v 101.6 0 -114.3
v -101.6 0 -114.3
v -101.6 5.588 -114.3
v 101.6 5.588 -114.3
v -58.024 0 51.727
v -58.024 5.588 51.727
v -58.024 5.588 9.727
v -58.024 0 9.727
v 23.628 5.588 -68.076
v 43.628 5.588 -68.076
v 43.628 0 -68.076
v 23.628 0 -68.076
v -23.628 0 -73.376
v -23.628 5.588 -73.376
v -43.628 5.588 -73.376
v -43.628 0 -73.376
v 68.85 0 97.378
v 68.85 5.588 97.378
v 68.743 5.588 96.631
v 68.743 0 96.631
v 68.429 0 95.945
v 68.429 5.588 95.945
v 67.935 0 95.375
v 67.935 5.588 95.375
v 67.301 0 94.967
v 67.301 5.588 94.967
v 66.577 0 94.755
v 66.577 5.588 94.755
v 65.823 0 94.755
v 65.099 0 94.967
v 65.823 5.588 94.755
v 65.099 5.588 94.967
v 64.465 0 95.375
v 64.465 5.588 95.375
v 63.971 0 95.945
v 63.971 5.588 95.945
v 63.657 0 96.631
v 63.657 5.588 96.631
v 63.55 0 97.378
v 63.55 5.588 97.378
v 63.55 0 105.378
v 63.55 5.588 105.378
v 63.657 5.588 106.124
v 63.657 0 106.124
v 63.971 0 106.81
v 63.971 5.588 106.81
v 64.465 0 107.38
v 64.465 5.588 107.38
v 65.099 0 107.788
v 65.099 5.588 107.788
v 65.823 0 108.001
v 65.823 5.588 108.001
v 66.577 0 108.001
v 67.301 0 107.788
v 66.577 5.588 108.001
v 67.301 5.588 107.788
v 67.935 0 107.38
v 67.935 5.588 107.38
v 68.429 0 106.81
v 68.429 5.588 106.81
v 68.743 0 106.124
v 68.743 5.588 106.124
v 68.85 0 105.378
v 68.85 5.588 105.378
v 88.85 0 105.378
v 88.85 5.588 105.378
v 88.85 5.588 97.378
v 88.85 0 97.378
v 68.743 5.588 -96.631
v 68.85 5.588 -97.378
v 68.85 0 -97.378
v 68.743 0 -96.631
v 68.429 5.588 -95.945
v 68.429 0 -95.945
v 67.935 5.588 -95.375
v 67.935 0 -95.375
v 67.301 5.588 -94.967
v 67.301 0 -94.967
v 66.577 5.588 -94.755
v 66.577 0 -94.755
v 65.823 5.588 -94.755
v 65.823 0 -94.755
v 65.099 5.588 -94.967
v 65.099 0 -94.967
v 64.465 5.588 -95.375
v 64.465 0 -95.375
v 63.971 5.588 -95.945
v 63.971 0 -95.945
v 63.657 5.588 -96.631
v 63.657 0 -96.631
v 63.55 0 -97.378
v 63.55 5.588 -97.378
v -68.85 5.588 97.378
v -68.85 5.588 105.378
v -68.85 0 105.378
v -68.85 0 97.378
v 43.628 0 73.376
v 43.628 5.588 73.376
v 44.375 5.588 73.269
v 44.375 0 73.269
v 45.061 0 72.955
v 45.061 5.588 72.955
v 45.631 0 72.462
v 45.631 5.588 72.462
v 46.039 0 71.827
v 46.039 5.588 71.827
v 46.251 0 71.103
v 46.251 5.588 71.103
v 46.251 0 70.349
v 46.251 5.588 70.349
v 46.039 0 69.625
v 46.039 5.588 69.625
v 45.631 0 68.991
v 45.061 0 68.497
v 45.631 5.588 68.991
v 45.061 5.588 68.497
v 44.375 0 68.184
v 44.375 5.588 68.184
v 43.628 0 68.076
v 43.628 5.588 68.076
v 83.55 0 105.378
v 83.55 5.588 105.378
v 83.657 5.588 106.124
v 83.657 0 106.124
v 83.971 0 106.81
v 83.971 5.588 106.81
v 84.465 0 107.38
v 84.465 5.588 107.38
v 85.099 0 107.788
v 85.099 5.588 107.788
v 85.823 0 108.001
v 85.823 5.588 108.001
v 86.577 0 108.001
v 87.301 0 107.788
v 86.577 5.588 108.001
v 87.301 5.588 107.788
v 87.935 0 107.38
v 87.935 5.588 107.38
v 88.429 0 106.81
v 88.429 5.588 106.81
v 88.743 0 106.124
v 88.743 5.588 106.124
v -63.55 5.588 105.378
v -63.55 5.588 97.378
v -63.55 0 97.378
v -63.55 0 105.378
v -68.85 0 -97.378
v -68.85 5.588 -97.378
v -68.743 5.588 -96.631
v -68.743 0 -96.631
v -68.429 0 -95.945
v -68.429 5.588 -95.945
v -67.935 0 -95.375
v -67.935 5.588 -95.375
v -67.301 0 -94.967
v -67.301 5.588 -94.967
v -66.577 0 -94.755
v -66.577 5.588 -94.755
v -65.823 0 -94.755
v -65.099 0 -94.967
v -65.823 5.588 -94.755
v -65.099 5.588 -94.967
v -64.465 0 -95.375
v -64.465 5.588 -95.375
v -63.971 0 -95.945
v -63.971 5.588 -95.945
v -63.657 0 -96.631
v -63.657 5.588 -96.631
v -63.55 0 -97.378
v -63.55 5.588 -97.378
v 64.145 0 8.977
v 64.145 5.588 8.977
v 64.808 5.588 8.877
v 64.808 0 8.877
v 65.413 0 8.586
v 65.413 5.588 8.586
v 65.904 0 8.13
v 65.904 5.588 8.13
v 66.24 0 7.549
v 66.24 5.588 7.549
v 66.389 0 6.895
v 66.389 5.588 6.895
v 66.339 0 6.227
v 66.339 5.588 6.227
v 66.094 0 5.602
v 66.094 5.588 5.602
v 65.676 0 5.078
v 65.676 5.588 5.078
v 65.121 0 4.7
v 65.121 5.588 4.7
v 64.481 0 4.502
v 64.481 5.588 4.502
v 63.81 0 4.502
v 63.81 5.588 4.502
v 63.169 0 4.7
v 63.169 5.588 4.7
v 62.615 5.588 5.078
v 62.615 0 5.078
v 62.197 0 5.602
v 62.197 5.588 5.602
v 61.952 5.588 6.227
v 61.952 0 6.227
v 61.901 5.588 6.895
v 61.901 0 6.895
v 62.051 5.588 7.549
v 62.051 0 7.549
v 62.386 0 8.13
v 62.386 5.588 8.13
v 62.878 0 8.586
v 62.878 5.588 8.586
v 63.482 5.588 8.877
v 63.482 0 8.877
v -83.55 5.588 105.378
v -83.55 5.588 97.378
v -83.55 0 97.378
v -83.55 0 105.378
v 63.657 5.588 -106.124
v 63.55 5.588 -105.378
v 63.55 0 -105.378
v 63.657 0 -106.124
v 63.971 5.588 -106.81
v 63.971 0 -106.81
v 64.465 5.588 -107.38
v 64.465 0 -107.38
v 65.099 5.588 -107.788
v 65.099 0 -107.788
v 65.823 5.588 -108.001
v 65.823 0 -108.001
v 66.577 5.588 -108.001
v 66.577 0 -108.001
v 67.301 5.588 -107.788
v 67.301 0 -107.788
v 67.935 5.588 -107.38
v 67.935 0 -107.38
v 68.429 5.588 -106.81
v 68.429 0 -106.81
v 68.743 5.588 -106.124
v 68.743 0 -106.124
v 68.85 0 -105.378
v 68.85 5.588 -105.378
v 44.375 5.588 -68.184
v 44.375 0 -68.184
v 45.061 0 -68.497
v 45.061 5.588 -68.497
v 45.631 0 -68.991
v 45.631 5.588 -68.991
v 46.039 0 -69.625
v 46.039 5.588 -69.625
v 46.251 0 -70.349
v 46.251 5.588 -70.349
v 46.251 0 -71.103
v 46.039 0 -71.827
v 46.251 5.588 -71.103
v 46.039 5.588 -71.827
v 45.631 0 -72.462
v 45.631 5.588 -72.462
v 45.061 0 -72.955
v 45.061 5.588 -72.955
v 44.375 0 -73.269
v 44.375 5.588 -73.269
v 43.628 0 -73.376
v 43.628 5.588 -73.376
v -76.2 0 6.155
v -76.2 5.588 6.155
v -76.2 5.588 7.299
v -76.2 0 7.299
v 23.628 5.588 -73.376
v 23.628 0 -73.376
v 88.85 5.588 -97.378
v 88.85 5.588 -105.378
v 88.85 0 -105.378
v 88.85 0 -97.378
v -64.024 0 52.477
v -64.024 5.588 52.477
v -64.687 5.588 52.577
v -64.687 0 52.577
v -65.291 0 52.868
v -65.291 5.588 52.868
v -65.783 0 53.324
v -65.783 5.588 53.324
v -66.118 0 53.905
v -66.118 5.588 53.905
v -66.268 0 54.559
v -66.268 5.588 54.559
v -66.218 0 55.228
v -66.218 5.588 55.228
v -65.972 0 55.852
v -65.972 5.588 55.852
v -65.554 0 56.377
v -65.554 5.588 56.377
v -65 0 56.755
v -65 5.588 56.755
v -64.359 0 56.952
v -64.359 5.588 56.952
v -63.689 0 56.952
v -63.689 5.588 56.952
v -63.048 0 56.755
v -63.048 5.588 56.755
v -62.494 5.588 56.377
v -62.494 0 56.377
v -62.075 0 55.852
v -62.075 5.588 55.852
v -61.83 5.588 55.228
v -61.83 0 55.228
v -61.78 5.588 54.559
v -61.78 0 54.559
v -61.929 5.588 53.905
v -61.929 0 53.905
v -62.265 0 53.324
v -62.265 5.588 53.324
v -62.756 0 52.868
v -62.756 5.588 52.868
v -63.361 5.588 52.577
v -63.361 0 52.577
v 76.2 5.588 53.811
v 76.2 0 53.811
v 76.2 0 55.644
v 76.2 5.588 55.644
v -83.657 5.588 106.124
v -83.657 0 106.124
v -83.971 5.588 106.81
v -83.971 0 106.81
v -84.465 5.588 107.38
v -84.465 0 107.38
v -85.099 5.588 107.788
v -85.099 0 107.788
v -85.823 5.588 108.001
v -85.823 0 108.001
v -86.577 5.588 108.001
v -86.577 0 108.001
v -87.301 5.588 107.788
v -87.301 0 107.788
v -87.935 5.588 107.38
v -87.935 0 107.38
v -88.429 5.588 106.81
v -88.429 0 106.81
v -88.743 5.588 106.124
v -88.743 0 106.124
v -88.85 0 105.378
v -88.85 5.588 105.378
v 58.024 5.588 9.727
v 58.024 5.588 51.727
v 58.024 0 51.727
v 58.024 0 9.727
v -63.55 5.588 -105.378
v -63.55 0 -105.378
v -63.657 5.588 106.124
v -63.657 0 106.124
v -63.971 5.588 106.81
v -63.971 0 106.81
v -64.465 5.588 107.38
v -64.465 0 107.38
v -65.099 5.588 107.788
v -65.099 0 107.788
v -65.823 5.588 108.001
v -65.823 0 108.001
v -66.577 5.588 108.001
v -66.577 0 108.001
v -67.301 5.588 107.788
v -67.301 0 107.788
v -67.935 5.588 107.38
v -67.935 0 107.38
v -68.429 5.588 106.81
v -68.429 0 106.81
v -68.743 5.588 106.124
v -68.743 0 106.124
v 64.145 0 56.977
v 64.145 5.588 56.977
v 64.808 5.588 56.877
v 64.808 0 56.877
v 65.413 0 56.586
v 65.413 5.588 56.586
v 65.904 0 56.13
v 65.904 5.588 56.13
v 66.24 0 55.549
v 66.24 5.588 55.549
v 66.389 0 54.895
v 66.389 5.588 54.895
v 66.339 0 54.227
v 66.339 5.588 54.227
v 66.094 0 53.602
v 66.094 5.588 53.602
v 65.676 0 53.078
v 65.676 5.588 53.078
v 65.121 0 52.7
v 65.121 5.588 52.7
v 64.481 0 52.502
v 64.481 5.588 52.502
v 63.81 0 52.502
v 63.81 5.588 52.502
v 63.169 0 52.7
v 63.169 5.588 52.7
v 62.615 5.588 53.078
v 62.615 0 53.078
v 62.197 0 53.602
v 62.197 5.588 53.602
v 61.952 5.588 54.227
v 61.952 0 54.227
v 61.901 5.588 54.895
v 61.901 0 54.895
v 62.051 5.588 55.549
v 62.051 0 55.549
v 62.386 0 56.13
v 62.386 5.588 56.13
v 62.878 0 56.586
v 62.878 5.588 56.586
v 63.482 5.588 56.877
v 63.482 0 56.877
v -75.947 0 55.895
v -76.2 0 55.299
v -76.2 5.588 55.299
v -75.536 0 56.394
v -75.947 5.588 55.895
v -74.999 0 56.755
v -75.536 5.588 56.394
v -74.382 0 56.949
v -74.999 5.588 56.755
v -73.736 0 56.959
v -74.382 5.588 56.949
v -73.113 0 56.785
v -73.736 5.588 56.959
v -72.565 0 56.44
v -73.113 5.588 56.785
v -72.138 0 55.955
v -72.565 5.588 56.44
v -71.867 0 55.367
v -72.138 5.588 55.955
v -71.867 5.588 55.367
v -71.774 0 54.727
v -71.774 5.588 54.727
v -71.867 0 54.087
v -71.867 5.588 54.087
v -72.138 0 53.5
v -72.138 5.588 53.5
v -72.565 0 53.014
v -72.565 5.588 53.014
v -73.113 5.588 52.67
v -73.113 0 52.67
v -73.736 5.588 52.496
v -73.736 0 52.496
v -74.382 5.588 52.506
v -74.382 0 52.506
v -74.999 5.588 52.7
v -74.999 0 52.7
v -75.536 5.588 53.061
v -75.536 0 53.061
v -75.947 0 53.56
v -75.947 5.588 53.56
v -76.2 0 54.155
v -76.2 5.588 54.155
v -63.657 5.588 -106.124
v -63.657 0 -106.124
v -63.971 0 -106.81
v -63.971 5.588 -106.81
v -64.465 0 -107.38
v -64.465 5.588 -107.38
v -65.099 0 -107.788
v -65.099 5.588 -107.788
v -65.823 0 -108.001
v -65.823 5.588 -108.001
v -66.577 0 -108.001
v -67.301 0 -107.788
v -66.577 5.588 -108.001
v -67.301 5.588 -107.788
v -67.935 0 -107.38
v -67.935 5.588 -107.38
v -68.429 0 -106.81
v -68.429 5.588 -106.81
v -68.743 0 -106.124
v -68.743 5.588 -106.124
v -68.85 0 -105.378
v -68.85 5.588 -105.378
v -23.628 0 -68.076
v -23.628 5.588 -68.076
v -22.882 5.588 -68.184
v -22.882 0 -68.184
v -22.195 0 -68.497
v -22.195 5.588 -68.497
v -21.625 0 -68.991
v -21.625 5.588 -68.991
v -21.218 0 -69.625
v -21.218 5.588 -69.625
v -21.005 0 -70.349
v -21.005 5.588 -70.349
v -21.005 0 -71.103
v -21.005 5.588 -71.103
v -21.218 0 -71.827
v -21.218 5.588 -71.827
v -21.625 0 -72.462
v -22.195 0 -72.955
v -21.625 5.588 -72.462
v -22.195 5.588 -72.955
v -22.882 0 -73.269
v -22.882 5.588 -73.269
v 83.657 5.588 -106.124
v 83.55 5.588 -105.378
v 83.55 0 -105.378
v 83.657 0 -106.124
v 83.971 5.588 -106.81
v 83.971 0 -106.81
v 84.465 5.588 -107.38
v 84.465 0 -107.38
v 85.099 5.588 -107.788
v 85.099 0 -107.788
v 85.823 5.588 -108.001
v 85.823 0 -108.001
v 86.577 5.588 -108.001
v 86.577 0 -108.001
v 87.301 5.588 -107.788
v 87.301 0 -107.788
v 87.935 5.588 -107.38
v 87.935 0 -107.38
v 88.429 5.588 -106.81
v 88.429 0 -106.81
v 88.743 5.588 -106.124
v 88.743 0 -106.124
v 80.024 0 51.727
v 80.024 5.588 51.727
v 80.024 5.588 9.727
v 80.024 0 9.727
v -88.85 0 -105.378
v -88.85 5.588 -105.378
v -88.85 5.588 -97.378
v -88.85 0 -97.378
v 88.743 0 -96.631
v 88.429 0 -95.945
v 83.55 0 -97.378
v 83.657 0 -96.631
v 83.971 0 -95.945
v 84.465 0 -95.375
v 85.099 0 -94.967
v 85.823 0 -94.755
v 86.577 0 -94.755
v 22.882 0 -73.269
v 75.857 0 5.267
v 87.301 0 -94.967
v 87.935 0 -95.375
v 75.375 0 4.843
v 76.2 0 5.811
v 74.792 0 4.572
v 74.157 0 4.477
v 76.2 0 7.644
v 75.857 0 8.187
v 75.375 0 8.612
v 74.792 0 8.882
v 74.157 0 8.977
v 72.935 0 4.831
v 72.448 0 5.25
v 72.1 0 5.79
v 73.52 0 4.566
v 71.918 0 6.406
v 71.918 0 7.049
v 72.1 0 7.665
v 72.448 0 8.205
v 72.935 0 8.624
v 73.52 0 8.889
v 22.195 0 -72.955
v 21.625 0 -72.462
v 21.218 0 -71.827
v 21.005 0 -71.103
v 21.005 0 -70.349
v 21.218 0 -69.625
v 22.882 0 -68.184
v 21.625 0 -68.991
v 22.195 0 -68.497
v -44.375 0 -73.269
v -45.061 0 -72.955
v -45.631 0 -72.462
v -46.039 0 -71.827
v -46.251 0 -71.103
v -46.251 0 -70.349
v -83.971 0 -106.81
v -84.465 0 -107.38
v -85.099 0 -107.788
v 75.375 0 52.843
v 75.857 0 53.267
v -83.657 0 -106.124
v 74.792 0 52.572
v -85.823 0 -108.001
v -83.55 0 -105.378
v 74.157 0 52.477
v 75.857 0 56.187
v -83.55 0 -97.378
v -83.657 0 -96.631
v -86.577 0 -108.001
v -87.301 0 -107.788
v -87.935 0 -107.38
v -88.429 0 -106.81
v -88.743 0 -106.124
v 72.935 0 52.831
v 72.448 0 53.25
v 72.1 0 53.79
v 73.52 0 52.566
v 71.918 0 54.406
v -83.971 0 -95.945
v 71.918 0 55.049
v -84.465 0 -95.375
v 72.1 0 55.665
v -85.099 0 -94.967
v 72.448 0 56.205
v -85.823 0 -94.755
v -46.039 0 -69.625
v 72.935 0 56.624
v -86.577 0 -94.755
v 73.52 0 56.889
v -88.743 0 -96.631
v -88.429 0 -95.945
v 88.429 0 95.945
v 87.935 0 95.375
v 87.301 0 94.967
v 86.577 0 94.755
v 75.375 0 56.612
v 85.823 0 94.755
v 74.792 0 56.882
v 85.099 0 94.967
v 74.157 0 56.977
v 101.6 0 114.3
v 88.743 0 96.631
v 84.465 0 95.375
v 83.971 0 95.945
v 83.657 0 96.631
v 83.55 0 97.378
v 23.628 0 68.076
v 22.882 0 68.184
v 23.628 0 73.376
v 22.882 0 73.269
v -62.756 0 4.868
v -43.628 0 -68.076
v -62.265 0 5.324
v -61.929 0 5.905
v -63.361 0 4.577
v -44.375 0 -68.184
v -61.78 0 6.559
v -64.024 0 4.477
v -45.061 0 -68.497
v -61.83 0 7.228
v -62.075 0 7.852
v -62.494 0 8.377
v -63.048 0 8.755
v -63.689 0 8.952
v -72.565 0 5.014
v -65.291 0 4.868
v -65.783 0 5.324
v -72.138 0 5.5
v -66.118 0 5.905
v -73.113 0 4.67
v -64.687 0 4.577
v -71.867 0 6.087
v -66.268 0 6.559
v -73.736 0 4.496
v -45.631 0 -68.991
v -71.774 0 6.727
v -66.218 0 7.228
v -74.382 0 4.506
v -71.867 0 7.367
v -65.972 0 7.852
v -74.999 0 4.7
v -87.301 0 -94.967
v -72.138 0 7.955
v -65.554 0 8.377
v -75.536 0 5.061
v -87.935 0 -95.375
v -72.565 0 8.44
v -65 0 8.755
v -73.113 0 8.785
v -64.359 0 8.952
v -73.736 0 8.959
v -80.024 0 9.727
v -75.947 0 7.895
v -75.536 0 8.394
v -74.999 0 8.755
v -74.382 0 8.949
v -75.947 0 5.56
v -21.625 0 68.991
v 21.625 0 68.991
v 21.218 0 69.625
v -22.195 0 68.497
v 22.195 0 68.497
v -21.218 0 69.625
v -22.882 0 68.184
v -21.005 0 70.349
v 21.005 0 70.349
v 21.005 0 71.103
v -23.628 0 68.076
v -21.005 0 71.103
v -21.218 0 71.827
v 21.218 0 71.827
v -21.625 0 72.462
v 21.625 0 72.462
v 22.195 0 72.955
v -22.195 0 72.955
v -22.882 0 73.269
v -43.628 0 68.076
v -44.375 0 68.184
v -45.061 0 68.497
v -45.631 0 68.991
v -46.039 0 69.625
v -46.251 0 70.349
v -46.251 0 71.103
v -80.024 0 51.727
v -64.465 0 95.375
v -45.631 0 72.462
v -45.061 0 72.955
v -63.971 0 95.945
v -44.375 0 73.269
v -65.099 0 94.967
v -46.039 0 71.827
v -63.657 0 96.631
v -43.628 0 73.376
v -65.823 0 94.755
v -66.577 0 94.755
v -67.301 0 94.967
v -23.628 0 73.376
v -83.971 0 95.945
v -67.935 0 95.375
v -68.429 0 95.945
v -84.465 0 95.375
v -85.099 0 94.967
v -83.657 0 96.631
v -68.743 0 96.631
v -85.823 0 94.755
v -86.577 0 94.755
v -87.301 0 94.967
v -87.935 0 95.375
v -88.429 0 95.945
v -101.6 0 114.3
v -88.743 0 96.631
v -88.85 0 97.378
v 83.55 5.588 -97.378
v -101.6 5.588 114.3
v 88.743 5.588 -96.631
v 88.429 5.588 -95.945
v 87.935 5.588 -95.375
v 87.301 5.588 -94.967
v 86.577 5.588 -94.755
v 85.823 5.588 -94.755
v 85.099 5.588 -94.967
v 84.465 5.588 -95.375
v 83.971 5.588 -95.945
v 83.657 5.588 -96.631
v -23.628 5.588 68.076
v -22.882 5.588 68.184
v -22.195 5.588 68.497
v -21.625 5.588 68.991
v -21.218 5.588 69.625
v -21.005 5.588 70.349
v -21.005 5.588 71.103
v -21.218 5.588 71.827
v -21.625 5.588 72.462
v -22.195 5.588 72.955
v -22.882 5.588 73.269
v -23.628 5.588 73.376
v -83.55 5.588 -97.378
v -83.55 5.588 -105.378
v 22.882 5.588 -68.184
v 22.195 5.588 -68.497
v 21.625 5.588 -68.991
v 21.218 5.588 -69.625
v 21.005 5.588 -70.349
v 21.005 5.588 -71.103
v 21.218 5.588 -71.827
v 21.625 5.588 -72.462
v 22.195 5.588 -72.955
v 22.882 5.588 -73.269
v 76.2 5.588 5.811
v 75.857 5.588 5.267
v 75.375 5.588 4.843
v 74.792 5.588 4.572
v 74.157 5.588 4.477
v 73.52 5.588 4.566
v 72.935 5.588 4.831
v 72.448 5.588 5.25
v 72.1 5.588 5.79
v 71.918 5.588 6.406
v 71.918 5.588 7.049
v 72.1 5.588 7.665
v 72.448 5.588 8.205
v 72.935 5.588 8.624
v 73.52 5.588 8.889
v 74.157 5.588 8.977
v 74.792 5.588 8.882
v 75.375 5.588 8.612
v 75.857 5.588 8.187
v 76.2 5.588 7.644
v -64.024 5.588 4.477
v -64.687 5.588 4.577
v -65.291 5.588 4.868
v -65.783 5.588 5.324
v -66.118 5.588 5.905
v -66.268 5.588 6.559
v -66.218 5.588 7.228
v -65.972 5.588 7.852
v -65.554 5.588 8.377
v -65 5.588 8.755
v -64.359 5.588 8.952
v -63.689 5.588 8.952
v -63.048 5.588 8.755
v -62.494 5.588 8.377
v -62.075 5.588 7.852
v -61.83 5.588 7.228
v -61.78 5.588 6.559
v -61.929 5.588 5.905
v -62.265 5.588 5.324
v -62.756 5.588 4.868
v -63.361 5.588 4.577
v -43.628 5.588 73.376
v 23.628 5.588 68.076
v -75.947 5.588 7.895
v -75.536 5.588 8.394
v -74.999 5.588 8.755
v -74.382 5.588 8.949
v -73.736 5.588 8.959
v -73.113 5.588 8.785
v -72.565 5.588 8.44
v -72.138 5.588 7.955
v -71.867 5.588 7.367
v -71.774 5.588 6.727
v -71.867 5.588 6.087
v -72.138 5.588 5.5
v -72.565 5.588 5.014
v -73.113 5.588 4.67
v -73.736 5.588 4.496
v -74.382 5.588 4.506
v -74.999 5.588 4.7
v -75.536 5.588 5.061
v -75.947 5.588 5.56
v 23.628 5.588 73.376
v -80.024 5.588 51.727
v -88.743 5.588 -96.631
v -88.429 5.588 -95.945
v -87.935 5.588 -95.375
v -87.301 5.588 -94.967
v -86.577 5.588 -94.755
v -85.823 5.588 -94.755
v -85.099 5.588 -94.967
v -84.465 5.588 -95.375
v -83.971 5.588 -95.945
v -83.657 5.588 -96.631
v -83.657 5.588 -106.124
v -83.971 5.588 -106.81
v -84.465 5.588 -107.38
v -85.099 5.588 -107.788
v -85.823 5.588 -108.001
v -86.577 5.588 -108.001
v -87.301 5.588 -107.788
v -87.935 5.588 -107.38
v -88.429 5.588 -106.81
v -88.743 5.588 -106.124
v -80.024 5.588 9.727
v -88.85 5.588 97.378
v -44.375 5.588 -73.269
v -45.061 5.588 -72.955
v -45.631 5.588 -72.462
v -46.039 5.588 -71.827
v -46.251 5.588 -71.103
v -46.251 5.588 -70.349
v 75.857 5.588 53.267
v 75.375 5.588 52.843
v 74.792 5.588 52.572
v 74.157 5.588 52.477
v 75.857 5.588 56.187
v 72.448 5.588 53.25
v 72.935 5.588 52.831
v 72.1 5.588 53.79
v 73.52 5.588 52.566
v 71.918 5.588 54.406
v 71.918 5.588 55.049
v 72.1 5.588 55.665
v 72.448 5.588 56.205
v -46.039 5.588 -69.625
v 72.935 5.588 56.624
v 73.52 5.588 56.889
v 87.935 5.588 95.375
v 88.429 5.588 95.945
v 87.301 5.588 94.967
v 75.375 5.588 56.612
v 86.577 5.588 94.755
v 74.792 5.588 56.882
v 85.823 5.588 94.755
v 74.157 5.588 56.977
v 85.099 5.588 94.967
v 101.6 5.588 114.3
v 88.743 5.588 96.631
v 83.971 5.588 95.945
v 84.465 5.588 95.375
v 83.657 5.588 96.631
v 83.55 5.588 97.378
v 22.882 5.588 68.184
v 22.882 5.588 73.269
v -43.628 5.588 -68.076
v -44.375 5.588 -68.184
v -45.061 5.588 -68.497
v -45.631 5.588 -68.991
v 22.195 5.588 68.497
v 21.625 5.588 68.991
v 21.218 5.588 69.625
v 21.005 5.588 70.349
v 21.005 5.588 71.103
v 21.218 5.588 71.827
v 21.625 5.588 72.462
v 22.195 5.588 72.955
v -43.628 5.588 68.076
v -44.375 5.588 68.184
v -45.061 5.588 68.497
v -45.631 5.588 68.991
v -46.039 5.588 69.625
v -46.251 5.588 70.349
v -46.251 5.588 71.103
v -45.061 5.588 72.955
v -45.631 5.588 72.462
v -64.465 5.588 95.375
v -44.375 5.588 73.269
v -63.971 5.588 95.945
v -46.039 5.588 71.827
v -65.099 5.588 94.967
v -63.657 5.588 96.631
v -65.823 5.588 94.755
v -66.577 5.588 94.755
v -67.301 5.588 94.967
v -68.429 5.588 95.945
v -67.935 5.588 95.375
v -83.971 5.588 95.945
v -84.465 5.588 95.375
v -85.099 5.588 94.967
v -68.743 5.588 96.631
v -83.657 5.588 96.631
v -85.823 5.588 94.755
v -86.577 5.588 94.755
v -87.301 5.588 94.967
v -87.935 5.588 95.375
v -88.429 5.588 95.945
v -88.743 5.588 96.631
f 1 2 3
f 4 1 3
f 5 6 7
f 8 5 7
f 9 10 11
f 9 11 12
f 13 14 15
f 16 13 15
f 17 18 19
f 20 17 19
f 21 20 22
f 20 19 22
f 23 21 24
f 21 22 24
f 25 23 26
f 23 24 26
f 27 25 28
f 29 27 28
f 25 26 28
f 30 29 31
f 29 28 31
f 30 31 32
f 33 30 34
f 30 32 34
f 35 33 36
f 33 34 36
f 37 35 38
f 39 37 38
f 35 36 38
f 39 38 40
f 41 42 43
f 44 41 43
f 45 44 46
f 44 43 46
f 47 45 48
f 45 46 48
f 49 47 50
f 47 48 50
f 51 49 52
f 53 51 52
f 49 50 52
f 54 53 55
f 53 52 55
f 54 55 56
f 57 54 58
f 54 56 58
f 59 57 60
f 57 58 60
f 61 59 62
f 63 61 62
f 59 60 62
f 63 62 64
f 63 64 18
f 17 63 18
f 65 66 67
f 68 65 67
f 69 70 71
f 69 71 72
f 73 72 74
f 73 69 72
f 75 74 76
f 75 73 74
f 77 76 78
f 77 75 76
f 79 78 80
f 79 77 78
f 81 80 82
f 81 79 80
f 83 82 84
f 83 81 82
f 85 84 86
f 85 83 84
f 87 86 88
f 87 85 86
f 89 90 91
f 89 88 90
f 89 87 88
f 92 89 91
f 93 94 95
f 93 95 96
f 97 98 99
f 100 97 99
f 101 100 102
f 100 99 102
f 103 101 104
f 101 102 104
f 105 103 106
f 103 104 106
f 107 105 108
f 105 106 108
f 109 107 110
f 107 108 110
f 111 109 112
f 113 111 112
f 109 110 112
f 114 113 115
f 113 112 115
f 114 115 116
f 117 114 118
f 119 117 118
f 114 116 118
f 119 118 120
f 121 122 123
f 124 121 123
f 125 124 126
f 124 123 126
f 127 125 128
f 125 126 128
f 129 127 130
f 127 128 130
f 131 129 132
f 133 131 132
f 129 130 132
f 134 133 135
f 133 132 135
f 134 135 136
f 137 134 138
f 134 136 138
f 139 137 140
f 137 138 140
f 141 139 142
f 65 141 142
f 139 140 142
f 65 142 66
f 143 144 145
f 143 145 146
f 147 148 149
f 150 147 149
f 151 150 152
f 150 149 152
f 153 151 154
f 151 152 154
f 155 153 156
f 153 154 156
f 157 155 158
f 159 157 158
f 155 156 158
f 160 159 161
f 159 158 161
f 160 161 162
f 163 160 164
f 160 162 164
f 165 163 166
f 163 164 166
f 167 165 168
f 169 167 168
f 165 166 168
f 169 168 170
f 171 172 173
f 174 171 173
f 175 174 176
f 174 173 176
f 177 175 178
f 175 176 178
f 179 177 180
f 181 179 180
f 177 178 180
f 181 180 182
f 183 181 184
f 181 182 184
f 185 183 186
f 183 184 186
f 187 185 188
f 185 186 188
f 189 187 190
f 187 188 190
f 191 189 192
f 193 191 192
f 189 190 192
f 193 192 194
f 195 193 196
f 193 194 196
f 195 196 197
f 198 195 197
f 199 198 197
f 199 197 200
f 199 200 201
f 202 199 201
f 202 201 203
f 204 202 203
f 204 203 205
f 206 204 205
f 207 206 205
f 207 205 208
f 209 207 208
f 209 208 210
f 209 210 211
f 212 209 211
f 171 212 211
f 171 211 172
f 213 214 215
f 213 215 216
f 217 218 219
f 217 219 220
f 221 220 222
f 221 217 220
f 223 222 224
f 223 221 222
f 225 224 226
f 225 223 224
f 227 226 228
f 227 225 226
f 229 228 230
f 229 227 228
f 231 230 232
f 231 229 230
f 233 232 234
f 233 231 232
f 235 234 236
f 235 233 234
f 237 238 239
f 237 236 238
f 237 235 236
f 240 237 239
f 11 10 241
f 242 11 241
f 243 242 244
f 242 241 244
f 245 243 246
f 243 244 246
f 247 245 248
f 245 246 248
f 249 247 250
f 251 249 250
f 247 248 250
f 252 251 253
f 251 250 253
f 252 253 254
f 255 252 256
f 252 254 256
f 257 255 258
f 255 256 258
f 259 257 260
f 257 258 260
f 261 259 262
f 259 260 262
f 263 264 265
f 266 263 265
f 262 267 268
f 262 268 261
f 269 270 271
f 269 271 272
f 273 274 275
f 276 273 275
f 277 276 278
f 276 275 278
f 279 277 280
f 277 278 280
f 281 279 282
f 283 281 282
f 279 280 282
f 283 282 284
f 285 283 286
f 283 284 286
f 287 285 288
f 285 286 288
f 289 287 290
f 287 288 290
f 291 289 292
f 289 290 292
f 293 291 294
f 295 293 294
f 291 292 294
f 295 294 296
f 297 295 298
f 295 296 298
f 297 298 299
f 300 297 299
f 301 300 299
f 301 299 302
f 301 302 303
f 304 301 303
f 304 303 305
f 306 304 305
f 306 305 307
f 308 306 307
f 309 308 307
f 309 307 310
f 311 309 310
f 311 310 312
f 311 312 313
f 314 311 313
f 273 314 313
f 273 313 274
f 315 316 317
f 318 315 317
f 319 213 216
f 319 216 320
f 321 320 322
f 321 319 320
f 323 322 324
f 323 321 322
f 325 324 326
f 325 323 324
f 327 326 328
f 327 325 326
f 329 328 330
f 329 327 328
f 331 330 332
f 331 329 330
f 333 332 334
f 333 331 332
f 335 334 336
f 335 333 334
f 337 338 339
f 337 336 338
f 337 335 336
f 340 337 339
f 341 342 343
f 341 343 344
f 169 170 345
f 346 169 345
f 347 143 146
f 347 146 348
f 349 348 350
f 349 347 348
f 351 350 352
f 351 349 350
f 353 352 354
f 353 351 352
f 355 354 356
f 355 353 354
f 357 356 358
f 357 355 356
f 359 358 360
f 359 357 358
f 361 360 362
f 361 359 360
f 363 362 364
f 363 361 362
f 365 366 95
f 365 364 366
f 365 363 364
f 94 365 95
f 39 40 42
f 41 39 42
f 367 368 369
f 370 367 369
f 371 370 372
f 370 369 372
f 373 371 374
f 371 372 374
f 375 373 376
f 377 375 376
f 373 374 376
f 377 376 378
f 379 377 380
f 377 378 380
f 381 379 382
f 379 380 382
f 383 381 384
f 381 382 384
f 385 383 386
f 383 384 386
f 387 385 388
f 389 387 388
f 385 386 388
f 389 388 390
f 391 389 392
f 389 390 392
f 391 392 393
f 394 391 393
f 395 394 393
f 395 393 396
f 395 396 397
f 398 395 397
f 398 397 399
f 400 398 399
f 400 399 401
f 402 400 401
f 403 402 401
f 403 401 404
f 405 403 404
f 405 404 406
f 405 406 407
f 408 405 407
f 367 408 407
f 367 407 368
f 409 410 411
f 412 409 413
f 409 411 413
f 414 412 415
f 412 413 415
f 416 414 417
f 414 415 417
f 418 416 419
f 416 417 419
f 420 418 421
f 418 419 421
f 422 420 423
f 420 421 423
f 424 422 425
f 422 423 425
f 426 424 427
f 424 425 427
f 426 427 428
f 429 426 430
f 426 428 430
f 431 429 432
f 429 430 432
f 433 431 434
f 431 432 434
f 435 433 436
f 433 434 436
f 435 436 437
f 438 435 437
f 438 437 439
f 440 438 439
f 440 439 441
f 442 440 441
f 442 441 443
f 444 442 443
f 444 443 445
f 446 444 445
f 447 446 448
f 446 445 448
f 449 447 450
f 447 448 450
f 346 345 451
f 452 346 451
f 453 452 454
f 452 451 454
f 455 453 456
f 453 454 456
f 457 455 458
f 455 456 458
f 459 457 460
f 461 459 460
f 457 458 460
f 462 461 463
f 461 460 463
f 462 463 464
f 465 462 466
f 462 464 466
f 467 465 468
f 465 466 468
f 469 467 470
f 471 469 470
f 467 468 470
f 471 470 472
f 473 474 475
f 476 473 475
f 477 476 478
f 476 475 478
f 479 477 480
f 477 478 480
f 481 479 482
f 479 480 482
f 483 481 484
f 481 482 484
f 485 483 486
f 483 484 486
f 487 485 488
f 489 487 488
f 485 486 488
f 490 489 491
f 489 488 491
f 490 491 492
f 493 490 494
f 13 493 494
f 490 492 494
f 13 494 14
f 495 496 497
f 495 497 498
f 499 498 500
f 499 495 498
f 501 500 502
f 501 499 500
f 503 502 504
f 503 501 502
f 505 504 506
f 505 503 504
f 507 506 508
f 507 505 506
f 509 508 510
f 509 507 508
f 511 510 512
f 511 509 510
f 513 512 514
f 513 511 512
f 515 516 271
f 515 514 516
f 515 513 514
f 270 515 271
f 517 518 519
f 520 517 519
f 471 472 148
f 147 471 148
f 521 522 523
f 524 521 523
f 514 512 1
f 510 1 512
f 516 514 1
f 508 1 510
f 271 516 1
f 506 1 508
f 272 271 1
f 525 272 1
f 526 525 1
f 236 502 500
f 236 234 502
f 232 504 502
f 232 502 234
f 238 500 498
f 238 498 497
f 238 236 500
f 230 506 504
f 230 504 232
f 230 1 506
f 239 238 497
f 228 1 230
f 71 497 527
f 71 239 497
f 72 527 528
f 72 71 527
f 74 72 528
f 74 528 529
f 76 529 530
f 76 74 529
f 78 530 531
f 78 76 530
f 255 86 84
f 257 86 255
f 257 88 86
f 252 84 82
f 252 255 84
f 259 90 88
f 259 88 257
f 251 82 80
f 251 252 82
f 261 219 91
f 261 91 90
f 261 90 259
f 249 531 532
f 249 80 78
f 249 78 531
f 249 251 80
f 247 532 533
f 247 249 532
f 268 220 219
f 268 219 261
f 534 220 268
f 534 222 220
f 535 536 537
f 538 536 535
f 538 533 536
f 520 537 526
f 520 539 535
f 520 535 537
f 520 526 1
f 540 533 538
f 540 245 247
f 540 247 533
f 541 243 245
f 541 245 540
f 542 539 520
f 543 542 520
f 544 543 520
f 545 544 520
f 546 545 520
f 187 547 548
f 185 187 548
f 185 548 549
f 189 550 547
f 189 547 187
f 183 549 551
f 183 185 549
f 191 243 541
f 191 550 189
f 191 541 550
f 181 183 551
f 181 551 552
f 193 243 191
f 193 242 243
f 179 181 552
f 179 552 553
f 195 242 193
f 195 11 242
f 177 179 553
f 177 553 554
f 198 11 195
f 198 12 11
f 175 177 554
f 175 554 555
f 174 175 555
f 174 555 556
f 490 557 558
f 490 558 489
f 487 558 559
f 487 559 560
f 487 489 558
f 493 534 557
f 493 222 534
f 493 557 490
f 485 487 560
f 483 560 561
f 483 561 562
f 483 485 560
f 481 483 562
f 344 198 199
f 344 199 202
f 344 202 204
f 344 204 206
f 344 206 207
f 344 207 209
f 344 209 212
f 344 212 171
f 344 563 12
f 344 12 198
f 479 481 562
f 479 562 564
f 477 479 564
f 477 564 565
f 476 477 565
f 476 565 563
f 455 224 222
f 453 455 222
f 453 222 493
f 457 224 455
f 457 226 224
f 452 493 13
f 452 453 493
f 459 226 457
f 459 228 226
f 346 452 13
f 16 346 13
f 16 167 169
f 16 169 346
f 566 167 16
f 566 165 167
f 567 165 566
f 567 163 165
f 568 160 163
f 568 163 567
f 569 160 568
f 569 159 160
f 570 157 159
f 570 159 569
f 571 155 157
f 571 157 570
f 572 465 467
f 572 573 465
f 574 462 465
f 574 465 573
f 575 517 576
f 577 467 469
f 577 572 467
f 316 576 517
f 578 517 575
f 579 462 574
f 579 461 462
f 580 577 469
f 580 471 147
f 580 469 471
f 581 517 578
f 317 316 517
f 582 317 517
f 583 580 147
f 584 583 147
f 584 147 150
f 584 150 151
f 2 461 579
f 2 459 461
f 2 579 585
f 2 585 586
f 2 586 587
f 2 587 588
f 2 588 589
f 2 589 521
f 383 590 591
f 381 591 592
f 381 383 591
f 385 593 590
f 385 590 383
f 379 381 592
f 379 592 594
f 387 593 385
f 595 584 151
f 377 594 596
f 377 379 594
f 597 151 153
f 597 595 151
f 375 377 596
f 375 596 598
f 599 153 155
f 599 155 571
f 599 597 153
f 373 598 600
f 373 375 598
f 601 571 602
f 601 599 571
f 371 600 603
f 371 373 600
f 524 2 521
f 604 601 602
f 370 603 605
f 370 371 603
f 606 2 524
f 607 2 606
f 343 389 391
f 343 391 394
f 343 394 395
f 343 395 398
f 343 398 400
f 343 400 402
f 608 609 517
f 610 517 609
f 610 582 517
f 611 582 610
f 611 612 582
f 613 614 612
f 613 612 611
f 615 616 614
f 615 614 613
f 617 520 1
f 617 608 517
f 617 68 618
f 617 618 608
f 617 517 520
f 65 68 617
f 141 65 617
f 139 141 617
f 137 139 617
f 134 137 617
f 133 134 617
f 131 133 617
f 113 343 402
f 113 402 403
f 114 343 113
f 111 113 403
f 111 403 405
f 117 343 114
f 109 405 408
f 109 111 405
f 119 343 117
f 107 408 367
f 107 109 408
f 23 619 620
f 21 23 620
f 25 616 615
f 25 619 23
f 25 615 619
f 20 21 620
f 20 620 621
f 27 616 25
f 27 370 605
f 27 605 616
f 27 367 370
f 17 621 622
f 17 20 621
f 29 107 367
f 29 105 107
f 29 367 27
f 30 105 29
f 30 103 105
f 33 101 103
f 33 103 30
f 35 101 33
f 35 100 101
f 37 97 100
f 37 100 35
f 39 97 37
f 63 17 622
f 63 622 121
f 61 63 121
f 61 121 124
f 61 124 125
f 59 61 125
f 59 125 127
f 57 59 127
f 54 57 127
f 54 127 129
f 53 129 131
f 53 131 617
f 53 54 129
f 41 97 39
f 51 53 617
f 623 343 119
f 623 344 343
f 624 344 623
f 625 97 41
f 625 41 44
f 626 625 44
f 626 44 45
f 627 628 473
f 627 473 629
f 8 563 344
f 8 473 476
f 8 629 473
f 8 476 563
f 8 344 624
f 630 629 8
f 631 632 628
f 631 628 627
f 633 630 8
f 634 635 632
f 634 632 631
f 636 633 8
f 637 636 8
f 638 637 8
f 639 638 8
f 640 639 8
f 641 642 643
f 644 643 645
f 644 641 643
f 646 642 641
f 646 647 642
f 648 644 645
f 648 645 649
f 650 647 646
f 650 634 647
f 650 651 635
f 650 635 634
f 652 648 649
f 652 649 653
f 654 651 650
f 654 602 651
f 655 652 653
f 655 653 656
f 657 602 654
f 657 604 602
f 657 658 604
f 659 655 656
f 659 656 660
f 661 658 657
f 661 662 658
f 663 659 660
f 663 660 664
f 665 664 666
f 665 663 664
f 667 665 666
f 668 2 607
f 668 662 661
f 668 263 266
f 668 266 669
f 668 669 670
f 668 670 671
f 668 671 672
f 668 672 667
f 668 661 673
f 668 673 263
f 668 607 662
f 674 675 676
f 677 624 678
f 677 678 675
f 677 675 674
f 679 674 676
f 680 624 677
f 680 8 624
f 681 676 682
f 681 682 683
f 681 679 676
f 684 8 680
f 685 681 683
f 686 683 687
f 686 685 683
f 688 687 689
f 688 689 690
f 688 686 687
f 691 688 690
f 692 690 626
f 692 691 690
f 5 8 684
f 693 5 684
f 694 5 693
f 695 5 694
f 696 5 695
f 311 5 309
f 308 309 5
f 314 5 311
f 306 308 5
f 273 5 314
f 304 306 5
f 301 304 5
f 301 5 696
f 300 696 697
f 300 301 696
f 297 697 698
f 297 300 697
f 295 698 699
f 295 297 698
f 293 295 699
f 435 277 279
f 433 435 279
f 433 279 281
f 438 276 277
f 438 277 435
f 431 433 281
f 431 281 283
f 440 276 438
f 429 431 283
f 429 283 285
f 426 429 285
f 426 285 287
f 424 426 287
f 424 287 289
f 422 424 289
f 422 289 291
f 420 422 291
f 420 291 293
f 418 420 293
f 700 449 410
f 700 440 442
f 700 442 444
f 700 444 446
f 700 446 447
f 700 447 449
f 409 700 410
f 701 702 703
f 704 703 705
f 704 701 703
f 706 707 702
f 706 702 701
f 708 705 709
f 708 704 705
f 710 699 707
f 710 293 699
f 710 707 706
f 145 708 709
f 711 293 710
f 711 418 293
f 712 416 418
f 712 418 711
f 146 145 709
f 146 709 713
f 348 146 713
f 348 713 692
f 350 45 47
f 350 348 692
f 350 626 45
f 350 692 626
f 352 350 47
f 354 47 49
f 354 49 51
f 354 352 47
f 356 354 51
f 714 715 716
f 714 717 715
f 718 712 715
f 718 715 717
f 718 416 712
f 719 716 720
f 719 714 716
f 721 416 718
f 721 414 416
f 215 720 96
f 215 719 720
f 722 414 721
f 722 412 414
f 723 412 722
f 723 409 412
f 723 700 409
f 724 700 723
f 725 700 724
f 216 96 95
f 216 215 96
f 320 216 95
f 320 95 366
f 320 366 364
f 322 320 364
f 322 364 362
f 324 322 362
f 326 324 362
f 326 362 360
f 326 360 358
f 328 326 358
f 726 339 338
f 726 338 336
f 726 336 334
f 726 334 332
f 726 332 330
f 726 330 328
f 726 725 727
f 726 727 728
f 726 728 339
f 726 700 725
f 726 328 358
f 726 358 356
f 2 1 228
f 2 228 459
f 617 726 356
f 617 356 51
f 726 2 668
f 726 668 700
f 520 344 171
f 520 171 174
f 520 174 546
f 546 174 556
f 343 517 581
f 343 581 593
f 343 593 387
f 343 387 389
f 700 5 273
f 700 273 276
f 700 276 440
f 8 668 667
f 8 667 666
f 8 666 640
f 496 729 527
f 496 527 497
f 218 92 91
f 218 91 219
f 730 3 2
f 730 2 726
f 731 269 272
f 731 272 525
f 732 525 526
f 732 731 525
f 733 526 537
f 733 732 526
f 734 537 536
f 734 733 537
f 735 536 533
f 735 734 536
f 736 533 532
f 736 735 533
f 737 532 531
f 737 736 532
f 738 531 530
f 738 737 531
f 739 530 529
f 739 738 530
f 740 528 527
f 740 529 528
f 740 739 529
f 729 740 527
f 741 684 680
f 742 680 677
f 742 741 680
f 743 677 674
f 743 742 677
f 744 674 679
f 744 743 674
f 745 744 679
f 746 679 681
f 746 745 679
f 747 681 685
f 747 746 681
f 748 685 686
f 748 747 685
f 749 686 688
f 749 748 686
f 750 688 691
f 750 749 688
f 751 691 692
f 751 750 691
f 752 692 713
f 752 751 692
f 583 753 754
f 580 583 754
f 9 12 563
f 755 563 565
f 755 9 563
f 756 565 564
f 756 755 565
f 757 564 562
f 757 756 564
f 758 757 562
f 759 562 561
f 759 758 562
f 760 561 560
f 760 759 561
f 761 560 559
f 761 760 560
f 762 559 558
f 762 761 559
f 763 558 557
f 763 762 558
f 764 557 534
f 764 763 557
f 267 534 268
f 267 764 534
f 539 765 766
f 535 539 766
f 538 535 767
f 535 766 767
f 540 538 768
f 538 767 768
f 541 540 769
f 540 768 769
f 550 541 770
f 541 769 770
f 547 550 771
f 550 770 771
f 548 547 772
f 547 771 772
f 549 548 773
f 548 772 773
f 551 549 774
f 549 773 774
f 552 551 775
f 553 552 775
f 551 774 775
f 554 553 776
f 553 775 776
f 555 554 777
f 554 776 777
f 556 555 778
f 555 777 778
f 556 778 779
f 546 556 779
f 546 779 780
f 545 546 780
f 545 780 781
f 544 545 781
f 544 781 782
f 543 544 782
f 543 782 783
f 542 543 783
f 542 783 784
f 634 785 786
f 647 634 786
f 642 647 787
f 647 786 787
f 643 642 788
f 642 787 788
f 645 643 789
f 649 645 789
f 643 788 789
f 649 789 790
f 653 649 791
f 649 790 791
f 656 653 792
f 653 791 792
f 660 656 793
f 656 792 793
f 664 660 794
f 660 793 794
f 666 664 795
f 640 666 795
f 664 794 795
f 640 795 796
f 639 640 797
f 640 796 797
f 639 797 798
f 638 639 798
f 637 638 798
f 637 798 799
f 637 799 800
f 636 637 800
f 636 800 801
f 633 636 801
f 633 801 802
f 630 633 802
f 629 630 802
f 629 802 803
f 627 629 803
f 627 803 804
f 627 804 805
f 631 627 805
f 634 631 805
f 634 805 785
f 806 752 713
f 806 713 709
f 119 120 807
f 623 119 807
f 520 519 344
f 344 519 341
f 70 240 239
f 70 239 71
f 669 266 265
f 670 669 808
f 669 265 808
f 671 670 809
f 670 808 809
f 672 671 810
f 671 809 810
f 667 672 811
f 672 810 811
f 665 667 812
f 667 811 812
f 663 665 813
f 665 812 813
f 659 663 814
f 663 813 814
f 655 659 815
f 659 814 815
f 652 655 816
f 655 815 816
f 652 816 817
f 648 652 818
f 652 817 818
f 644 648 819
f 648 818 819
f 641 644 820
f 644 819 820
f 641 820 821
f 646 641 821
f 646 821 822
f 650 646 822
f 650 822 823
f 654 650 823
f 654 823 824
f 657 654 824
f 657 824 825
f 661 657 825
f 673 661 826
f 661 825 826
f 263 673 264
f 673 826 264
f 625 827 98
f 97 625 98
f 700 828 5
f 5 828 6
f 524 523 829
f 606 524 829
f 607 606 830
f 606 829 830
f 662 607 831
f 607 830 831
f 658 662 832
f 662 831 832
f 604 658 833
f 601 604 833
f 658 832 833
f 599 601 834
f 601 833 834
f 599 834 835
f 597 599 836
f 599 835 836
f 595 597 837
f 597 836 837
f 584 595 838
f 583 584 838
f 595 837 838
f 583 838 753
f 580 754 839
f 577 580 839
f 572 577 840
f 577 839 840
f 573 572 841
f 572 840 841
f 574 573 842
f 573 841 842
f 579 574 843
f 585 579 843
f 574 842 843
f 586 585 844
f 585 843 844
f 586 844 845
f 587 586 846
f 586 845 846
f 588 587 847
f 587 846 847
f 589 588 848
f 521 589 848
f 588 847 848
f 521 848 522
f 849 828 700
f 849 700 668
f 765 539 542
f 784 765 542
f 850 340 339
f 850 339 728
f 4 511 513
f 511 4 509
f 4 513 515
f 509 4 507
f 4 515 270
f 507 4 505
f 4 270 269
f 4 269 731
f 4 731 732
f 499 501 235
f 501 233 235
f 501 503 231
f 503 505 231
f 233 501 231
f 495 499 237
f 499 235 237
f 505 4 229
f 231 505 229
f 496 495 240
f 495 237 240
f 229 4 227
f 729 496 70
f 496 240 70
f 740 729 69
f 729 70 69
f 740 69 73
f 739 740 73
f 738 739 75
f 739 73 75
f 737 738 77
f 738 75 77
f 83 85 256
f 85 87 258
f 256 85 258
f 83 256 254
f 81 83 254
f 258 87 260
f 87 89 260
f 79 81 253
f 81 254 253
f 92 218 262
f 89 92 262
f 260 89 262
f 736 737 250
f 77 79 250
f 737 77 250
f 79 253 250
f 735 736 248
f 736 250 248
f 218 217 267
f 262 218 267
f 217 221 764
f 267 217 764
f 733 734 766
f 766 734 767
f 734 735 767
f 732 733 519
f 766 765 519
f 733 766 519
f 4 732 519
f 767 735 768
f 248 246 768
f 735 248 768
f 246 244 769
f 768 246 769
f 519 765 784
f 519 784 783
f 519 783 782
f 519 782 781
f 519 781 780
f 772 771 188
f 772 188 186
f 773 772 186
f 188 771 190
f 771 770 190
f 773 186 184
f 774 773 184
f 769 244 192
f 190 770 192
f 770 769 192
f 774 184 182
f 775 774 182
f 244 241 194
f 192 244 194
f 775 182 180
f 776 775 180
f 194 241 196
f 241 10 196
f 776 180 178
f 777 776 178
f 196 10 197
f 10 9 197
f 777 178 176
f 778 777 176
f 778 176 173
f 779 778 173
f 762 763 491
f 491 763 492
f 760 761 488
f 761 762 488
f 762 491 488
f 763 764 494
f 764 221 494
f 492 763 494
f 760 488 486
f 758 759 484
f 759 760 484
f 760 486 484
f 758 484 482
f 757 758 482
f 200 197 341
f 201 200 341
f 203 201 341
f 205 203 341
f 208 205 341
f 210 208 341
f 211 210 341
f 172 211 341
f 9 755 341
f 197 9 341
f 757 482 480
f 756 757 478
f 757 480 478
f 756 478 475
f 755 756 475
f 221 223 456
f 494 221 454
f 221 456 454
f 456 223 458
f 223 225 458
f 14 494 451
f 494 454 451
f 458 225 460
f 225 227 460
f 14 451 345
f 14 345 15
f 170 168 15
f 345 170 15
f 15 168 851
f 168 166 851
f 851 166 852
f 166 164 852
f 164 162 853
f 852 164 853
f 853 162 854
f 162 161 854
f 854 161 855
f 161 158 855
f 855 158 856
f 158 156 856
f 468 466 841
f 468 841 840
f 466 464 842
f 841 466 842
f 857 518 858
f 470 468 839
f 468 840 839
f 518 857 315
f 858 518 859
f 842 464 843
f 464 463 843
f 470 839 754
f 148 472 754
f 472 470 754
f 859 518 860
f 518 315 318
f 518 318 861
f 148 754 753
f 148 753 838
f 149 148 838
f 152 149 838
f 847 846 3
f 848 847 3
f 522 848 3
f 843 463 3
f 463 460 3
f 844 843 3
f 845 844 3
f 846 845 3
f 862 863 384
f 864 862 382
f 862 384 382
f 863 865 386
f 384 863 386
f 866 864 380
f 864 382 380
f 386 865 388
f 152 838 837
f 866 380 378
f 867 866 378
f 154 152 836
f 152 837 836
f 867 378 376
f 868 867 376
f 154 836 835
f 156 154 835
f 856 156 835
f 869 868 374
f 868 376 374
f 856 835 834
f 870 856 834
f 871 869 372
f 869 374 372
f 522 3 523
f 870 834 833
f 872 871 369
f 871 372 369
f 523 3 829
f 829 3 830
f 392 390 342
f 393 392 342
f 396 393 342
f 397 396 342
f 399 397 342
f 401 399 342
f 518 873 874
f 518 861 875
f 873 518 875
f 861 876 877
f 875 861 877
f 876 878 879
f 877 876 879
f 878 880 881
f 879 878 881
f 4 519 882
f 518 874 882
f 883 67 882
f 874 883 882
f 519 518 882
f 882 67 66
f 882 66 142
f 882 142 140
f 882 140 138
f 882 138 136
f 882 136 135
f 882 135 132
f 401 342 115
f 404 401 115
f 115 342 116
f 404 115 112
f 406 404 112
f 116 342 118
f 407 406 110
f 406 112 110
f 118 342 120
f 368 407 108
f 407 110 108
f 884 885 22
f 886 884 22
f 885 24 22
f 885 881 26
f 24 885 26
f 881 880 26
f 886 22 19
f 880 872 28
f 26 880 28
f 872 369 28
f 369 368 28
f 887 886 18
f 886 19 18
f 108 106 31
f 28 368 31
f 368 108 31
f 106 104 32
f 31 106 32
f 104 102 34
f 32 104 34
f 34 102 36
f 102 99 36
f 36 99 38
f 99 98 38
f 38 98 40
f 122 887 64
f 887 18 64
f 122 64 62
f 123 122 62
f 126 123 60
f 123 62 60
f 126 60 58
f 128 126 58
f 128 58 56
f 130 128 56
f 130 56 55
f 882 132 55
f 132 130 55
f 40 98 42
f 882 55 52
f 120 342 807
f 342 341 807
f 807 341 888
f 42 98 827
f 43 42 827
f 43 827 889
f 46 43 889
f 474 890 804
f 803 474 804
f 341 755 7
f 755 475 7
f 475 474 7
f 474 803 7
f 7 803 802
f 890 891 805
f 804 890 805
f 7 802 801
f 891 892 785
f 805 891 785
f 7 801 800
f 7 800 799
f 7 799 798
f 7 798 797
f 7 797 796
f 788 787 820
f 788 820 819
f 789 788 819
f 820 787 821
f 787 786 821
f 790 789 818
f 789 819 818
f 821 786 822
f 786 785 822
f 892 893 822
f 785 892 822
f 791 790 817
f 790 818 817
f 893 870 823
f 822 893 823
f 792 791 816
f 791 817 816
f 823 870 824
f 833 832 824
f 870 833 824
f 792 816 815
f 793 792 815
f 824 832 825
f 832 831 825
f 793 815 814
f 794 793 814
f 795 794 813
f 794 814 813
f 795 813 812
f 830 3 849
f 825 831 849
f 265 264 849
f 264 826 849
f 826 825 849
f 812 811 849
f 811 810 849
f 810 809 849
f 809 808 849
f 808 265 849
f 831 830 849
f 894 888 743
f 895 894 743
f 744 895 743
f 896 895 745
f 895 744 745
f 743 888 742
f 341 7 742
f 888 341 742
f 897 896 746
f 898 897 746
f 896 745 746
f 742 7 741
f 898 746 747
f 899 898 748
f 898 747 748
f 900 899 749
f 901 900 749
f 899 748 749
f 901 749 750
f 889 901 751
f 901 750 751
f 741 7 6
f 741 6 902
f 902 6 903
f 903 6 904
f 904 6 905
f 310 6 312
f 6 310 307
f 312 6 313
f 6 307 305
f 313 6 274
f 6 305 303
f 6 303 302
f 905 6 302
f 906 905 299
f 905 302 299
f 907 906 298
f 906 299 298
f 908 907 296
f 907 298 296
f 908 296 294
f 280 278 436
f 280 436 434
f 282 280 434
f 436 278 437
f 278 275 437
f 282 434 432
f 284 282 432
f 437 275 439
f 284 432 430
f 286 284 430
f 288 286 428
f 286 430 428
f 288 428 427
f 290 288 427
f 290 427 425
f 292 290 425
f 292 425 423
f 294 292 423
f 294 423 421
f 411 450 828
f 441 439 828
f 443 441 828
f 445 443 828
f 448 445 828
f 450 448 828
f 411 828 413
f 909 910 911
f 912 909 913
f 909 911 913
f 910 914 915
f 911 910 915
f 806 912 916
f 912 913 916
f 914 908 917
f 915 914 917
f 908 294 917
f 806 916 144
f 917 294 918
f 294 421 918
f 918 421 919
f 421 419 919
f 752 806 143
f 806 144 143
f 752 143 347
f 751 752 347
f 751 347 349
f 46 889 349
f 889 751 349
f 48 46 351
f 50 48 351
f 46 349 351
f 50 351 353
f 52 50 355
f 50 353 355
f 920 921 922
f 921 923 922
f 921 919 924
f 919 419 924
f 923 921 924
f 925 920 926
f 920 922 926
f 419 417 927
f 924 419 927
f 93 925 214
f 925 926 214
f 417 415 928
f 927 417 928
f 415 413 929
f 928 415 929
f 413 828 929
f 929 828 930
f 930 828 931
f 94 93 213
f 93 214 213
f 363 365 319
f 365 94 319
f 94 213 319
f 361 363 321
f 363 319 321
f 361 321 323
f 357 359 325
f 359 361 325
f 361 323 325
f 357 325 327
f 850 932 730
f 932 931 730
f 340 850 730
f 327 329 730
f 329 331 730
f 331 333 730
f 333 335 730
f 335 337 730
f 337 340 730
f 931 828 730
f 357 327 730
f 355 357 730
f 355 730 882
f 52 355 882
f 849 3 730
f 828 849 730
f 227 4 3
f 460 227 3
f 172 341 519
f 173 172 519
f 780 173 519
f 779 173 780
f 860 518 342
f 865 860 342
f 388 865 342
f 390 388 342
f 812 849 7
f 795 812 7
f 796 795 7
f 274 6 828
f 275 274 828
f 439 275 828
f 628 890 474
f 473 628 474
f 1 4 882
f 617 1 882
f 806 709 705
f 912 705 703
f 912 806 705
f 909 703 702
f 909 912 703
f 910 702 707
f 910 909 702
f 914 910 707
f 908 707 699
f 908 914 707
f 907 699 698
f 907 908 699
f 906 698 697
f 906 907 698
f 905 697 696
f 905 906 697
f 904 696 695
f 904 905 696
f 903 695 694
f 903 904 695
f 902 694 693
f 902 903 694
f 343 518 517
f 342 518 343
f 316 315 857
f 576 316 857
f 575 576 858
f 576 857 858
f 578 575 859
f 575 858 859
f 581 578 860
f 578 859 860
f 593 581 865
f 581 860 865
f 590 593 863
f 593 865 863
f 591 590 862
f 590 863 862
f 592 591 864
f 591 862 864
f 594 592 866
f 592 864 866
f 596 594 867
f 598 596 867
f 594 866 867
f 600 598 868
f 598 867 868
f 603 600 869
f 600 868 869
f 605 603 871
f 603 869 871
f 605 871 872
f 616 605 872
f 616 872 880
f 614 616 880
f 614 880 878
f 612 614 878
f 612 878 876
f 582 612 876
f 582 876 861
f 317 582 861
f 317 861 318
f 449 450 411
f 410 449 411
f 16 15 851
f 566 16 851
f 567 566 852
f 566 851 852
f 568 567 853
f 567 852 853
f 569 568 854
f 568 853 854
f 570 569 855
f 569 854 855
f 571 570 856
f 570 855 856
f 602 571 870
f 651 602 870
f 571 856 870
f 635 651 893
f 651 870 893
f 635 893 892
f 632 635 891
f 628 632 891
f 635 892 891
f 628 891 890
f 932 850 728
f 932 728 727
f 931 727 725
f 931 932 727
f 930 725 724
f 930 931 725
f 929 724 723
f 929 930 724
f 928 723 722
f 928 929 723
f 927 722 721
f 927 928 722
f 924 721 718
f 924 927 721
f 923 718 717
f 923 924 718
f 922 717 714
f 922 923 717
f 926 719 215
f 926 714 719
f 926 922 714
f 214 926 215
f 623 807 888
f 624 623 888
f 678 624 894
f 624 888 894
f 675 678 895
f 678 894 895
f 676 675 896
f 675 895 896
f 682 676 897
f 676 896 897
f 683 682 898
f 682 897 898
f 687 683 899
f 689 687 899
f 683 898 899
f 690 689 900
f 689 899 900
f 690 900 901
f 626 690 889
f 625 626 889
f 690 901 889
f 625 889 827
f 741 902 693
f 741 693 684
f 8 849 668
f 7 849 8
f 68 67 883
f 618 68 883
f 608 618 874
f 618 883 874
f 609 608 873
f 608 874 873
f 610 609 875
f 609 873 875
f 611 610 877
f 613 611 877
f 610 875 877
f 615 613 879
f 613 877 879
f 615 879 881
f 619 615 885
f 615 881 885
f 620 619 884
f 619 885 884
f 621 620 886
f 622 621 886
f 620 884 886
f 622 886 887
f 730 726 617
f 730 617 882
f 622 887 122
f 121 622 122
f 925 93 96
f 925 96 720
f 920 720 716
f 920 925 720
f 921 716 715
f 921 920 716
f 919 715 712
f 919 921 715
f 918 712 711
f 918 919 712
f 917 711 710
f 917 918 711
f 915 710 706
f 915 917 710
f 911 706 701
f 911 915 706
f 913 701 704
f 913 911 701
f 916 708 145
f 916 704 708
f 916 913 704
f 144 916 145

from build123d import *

# Parameters (mm, degrees)
SKETCH1_W                                = 152.4
SKETCH1_H                                = 228.6
BOSS_EXTRUDE1_DEPTH                      = 5.588
SKETCH2_R                                = 2.25
SKETCH2_W                                = 22
SKETCH2_H                                = 42
CUT_EXTRUDE1_DEPTH                       = 138.48511099
SKETCH6_R                                = 2.65
CUT_EXTRUDE2_DEPTH                       = 430.910746044
CUT_EXTRUDE3_DEPTH                       = 138.48511099
MIRROR1_AT_THE_SECOND_PLANE_COPY_1_DEPTH = 138.48511099
SKETCH8_R                                = 2.65
CUT_EXTRUDE4_DEPTH                       = 430.910746044
CUT_EXTRUDE5_DEPTH                       = 138.48511099
MIRROR2_AT_THE_SECOND_PLANE_COPY_1_DEPTH = 138.48511099
SKETCH10_W                               = 228.6
SKETCH10_H                               = 5.588
BOSS_EXTRUDE2_DEPTH                      = 25.4
SKETCH11_W                               = 22
SKETCH11_H                               = 42
CUT_EXTRUDE6_DEPTH                       = 154.030309887
CUT_EXTRUDE7_DEPTH                       = 154.030309887
MIRROR5_AT_THE_SECOND_PLANE_COPY_1_DEPTH = 154.030309887


with BuildPart() as part:
    # Sketch1 → Boss-Extrude1 (new body)
    with BuildSketch(Plane(origin=(0, 0, 0), x_dir=(1, 0, 0), z_dir=(0, 1, 0))):
        Rectangle(SKETCH1_W, SKETCH1_H)
    extrude(amount=BOSS_EXTRUDE1_DEPTH)

    # Sketch2 → Cut-Extrude1 (cut, through all)
    with BuildSketch(Plane(origin=(0, 5.588, 0), x_dir=(1, 0, 0), z_dir=(0, 1, 0))):
        with Locations(Location((64.145199836, -6.727348554, 0), (0, 0, 270))):
            Circle(SKETCH2_R)
        with Locations((74.145199836, -6.727348554)):
            Circle(SKETCH2_R)
        with Locations(Location((64.145199836, -54.727348554, 0), (0, 0, 270))):
            Circle(SKETCH2_R)
        with Locations((74.145199836, -54.727348554)):
            Circle(SKETCH2_R)
        with Locations((-74.023936008, -54.727348554)):
            Circle(SKETCH2_R)
        with Locations(Location((-64.023936008, -54.727348554, 0), (0, 0, 90))):
            Circle(SKETCH2_R)
        with Locations((-74.023936008, -6.727348554)):
            Circle(SKETCH2_R)
        with Locations(Location((-64.023936008, -6.727348554, 0), (0, 0, 90))):
            Circle(SKETCH2_R)
        with Locations((69.145199836, -30.727348554)):
            Rectangle(SKETCH2_W, SKETCH2_H)
        with Locations((-69.023936008, -30.727348554)):
            Rectangle(SKETCH2_W, SKETCH2_H)
    extrude(amount=-CUT_EXTRUDE1_DEPTH, mode=Mode.SUBTRACT)

    # Sketch6 → Cut-Extrude2 (cut, through all)
    with BuildSketch(Plane(origin=(-338.200209725, 5.588, 0), x_dir=(1, 0, 0), z_dir=(0, 1, 0))):
        with Locations(Location((404.400209725, 104.3, 0), (0, 0, 270))):
            Circle(SKETCH6_R)
    extrude(amount=-CUT_EXTRUDE2_DEPTH, mode=Mode.SUBTRACT)

    # Sketch7 → Cut-Extrude3 (cut, through all)
    with BuildSketch(Plane(origin=(0, 5.588, 0), x_dir=(1, 0, 0), z_dir=(0, 1, 0))):
        with BuildLine():
            Line((68.85, 105.377738503), (68.85, 97.377738503))
            ThreePointArc((68.85, 97.377738503), (66.2, 94.727738503), (63.55, 97.377738503))
            Line((63.55, 97.377738503), (63.55, 105.377738503))
            ThreePointArc((63.55, 105.377738503), (66.2, 108.027738503), (68.85, 105.377738503))
        make_face()
    cut_extrude3 = extrude(amount=-CUT_EXTRUDE3_DEPTH, mode=Mode.SUBTRACT)

    # Mirror1: Cut-Extrude3 across plane
    add(cut_extrude3.mirror(Plane.XY), mode=Mode.SUBTRACT)

    # Mirror1 at the second plane: Cut-Extrude3 across plane
    add(cut_extrude3.mirror(Plane(origin=(0, 0, 0), x_dir=(0, 0, 1), z_dir=(1, 0, 0))), mode=Mode.SUBTRACT)

    # Mirror1 at the second plane copy 1 sketc → Mirror1 at the second plane copy 1 (cut, through all)
    with BuildSketch(Plane(origin=(0, 5.588, 0), x_dir=(-1, 0, 0), z_dir=(0, 1, 0))):
        with BuildLine():
            Line((68.85, 105.377738503), (68.85, 97.377738503))
            ThreePointArc((68.85, 97.377738503), (66.2, 94.727738503), (63.55, 97.377738503))
            Line((63.55, 97.377738503), (63.55, 105.377738503))
            ThreePointArc((63.55, 105.377738503), (66.2, 108.027738503), (68.85, 105.377738503))
        make_face()
    extrude(amount=-MIRROR1_AT_THE_SECOND_PLANE_COPY_1_DEPTH, mode=Mode.SUBTRACT)

    # Sketch8 → Cut-Extrude4 (cut, through all)
    with BuildSketch(Plane(origin=(-338.200209725, 5.588, 0), x_dir=(1, 0, 0), z_dir=(0, 1, 0))):
        with Locations(Location((381.82832329, 70.726177663, 0), (0, 0, 270))):
            Circle(SKETCH8_R)
    extrude(amount=-CUT_EXTRUDE4_DEPTH, mode=Mode.SUBTRACT)

    # Sketch9 → Cut-Extrude5 (cut, through all)
    with BuildSketch(Plane(origin=(0, 5.588, 0), x_dir=(1, 0, 0), z_dir=(0, 1, 0))):
        with BuildLine():
            Line((43.628113565, 68.076177663), (23.628113565, 68.076177663))
            ThreePointArc((23.628113565, 68.076177663), (20.978113565, 70.726177663), (23.628113565, 73.376177663))
            Line((23.628113565, 73.376177663), (43.628113565, 73.376177663))
            ThreePointArc((43.628113565, 73.376177663), (46.278113565, 70.726177663), (43.628113565, 68.076177663))
        make_face()
    cut_extrude5 = extrude(amount=-CUT_EXTRUDE5_DEPTH, mode=Mode.SUBTRACT)

    # Mirror2: Cut-Extrude5 across plane
    add(cut_extrude5.mirror(Plane.XY), mode=Mode.SUBTRACT)

    # Mirror2 at the second plane: Cut-Extrude5 across plane
    add(cut_extrude5.mirror(Plane(origin=(0, 0, 0), x_dir=(0, 0, 1), z_dir=(1, 0, 0))), mode=Mode.SUBTRACT)

    # Mirror2 at the second plane copy 1 sketc → Mirror2 at the second plane copy 1 (cut, through all)
    with BuildSketch(Plane(origin=(0, 5.588, 0), x_dir=(-1, 0, 0), z_dir=(0, 1, 0))):
        with BuildLine():
            Line((43.628113565, 68.076177663), (23.628113565, 68.076177663))
            ThreePointArc((23.628113565, 68.076177663), (20.978113565, 70.726177663), (23.628113565, 73.376177663))
            Line((23.628113565, 73.376177663), (43.628113565, 73.376177663))
            ThreePointArc((43.628113565, 73.376177663), (46.278113565, 70.726177663), (43.628113565, 68.076177663))
        make_face()
    extrude(amount=-MIRROR2_AT_THE_SECOND_PLANE_COPY_1_DEPTH, mode=Mode.SUBTRACT)

    # Sketch10 → Boss-Extrude2 (add)
    with BuildSketch(Plane.ZY.offset(76.2)):
        with Locations((0, 2.794)):
            Rectangle(SKETCH10_W, SKETCH10_H)
    boss_extrude2 = extrude(amount=BOSS_EXTRUDE2_DEPTH)

    # Sketch11 → Cut-Extrude6 (cut, through all)
    with BuildSketch(Plane(origin=(0, 5.588, 0), x_dir=(1, 0, 0), z_dir=(0, 1, 0))):
        with Locations((-69.023936008, -30.727348554)):
            Rectangle(SKETCH11_W, SKETCH11_H)
    cut_extrude6 = extrude(amount=-CUT_EXTRUDE6_DEPTH, mode=Mode.SUBTRACT)

    # Mirror4: Boss-Extrude2, Cut-Extrude6 across plane
    add(boss_extrude2.mirror(Plane(origin=(0, 0, 0), x_dir=(0, 0, 1), z_dir=(1, 0, 0))))
    add(cut_extrude6.mirror(Plane(origin=(0, 0, 0), x_dir=(0, 0, 1), z_dir=(1, 0, 0))), mode=Mode.SUBTRACT)

    # Sketch12 → Cut-Extrude7 (cut, through all)
    with BuildSketch(Plane(origin=(0, 5.588, 0), x_dir=(1, 0, 0), z_dir=(0, 1, 0))):
        with BuildLine():
            Line((-83.55, -97.377738503), (-83.55, -105.377738503))
            ThreePointArc((-83.55, -105.377738503), (-86.2, -108.027738503), (-88.85, -105.377738503))
            Line((-88.85, -105.377738503), (-88.85, -97.377738503))
            ThreePointArc((-88.85, -97.377738503), (-86.2, -94.727738503), (-83.55, -97.377738503))
        make_face()
    cut_extrude7 = extrude(amount=-CUT_EXTRUDE7_DEPTH, mode=Mode.SUBTRACT)

    # Mirror5: Cut-Extrude7 across plane
    add(cut_extrude7.mirror(Plane(origin=(0, 0, 0), x_dir=(0, 0, 1), z_dir=(1, 0, 0))), mode=Mode.SUBTRACT)

    # Mirror5 at the second plane: Cut-Extrude7 across plane
    add(cut_extrude7.mirror(Plane.XY), mode=Mode.SUBTRACT)

    # Mirror5 at the second plane copy 1 sketc → Mirror5 at the second plane copy 1 (cut, through all)
    with BuildSketch(Plane(origin=(0, 5.588, 0), x_dir=(-1, 0, 0), z_dir=(0, 1, 0))):
        with BuildLine():
            Line((-83.55, -97.377738503), (-83.55, -105.377738503))
            ThreePointArc((-83.55, -105.377738503), (-86.2, -108.027738503), (-88.85, -105.377738503))
            Line((-88.85, -105.377738503), (-88.85, -97.377738503))
            ThreePointArc((-88.85, -97.377738503), (-86.2, -94.727738503), (-83.55, -97.377738503))
        make_face()
    extrude(amount=-MIRROR5_AT_THE_SECOND_PLANE_COPY_1_DEPTH, mode=Mode.SUBTRACT)


solid = part.part
